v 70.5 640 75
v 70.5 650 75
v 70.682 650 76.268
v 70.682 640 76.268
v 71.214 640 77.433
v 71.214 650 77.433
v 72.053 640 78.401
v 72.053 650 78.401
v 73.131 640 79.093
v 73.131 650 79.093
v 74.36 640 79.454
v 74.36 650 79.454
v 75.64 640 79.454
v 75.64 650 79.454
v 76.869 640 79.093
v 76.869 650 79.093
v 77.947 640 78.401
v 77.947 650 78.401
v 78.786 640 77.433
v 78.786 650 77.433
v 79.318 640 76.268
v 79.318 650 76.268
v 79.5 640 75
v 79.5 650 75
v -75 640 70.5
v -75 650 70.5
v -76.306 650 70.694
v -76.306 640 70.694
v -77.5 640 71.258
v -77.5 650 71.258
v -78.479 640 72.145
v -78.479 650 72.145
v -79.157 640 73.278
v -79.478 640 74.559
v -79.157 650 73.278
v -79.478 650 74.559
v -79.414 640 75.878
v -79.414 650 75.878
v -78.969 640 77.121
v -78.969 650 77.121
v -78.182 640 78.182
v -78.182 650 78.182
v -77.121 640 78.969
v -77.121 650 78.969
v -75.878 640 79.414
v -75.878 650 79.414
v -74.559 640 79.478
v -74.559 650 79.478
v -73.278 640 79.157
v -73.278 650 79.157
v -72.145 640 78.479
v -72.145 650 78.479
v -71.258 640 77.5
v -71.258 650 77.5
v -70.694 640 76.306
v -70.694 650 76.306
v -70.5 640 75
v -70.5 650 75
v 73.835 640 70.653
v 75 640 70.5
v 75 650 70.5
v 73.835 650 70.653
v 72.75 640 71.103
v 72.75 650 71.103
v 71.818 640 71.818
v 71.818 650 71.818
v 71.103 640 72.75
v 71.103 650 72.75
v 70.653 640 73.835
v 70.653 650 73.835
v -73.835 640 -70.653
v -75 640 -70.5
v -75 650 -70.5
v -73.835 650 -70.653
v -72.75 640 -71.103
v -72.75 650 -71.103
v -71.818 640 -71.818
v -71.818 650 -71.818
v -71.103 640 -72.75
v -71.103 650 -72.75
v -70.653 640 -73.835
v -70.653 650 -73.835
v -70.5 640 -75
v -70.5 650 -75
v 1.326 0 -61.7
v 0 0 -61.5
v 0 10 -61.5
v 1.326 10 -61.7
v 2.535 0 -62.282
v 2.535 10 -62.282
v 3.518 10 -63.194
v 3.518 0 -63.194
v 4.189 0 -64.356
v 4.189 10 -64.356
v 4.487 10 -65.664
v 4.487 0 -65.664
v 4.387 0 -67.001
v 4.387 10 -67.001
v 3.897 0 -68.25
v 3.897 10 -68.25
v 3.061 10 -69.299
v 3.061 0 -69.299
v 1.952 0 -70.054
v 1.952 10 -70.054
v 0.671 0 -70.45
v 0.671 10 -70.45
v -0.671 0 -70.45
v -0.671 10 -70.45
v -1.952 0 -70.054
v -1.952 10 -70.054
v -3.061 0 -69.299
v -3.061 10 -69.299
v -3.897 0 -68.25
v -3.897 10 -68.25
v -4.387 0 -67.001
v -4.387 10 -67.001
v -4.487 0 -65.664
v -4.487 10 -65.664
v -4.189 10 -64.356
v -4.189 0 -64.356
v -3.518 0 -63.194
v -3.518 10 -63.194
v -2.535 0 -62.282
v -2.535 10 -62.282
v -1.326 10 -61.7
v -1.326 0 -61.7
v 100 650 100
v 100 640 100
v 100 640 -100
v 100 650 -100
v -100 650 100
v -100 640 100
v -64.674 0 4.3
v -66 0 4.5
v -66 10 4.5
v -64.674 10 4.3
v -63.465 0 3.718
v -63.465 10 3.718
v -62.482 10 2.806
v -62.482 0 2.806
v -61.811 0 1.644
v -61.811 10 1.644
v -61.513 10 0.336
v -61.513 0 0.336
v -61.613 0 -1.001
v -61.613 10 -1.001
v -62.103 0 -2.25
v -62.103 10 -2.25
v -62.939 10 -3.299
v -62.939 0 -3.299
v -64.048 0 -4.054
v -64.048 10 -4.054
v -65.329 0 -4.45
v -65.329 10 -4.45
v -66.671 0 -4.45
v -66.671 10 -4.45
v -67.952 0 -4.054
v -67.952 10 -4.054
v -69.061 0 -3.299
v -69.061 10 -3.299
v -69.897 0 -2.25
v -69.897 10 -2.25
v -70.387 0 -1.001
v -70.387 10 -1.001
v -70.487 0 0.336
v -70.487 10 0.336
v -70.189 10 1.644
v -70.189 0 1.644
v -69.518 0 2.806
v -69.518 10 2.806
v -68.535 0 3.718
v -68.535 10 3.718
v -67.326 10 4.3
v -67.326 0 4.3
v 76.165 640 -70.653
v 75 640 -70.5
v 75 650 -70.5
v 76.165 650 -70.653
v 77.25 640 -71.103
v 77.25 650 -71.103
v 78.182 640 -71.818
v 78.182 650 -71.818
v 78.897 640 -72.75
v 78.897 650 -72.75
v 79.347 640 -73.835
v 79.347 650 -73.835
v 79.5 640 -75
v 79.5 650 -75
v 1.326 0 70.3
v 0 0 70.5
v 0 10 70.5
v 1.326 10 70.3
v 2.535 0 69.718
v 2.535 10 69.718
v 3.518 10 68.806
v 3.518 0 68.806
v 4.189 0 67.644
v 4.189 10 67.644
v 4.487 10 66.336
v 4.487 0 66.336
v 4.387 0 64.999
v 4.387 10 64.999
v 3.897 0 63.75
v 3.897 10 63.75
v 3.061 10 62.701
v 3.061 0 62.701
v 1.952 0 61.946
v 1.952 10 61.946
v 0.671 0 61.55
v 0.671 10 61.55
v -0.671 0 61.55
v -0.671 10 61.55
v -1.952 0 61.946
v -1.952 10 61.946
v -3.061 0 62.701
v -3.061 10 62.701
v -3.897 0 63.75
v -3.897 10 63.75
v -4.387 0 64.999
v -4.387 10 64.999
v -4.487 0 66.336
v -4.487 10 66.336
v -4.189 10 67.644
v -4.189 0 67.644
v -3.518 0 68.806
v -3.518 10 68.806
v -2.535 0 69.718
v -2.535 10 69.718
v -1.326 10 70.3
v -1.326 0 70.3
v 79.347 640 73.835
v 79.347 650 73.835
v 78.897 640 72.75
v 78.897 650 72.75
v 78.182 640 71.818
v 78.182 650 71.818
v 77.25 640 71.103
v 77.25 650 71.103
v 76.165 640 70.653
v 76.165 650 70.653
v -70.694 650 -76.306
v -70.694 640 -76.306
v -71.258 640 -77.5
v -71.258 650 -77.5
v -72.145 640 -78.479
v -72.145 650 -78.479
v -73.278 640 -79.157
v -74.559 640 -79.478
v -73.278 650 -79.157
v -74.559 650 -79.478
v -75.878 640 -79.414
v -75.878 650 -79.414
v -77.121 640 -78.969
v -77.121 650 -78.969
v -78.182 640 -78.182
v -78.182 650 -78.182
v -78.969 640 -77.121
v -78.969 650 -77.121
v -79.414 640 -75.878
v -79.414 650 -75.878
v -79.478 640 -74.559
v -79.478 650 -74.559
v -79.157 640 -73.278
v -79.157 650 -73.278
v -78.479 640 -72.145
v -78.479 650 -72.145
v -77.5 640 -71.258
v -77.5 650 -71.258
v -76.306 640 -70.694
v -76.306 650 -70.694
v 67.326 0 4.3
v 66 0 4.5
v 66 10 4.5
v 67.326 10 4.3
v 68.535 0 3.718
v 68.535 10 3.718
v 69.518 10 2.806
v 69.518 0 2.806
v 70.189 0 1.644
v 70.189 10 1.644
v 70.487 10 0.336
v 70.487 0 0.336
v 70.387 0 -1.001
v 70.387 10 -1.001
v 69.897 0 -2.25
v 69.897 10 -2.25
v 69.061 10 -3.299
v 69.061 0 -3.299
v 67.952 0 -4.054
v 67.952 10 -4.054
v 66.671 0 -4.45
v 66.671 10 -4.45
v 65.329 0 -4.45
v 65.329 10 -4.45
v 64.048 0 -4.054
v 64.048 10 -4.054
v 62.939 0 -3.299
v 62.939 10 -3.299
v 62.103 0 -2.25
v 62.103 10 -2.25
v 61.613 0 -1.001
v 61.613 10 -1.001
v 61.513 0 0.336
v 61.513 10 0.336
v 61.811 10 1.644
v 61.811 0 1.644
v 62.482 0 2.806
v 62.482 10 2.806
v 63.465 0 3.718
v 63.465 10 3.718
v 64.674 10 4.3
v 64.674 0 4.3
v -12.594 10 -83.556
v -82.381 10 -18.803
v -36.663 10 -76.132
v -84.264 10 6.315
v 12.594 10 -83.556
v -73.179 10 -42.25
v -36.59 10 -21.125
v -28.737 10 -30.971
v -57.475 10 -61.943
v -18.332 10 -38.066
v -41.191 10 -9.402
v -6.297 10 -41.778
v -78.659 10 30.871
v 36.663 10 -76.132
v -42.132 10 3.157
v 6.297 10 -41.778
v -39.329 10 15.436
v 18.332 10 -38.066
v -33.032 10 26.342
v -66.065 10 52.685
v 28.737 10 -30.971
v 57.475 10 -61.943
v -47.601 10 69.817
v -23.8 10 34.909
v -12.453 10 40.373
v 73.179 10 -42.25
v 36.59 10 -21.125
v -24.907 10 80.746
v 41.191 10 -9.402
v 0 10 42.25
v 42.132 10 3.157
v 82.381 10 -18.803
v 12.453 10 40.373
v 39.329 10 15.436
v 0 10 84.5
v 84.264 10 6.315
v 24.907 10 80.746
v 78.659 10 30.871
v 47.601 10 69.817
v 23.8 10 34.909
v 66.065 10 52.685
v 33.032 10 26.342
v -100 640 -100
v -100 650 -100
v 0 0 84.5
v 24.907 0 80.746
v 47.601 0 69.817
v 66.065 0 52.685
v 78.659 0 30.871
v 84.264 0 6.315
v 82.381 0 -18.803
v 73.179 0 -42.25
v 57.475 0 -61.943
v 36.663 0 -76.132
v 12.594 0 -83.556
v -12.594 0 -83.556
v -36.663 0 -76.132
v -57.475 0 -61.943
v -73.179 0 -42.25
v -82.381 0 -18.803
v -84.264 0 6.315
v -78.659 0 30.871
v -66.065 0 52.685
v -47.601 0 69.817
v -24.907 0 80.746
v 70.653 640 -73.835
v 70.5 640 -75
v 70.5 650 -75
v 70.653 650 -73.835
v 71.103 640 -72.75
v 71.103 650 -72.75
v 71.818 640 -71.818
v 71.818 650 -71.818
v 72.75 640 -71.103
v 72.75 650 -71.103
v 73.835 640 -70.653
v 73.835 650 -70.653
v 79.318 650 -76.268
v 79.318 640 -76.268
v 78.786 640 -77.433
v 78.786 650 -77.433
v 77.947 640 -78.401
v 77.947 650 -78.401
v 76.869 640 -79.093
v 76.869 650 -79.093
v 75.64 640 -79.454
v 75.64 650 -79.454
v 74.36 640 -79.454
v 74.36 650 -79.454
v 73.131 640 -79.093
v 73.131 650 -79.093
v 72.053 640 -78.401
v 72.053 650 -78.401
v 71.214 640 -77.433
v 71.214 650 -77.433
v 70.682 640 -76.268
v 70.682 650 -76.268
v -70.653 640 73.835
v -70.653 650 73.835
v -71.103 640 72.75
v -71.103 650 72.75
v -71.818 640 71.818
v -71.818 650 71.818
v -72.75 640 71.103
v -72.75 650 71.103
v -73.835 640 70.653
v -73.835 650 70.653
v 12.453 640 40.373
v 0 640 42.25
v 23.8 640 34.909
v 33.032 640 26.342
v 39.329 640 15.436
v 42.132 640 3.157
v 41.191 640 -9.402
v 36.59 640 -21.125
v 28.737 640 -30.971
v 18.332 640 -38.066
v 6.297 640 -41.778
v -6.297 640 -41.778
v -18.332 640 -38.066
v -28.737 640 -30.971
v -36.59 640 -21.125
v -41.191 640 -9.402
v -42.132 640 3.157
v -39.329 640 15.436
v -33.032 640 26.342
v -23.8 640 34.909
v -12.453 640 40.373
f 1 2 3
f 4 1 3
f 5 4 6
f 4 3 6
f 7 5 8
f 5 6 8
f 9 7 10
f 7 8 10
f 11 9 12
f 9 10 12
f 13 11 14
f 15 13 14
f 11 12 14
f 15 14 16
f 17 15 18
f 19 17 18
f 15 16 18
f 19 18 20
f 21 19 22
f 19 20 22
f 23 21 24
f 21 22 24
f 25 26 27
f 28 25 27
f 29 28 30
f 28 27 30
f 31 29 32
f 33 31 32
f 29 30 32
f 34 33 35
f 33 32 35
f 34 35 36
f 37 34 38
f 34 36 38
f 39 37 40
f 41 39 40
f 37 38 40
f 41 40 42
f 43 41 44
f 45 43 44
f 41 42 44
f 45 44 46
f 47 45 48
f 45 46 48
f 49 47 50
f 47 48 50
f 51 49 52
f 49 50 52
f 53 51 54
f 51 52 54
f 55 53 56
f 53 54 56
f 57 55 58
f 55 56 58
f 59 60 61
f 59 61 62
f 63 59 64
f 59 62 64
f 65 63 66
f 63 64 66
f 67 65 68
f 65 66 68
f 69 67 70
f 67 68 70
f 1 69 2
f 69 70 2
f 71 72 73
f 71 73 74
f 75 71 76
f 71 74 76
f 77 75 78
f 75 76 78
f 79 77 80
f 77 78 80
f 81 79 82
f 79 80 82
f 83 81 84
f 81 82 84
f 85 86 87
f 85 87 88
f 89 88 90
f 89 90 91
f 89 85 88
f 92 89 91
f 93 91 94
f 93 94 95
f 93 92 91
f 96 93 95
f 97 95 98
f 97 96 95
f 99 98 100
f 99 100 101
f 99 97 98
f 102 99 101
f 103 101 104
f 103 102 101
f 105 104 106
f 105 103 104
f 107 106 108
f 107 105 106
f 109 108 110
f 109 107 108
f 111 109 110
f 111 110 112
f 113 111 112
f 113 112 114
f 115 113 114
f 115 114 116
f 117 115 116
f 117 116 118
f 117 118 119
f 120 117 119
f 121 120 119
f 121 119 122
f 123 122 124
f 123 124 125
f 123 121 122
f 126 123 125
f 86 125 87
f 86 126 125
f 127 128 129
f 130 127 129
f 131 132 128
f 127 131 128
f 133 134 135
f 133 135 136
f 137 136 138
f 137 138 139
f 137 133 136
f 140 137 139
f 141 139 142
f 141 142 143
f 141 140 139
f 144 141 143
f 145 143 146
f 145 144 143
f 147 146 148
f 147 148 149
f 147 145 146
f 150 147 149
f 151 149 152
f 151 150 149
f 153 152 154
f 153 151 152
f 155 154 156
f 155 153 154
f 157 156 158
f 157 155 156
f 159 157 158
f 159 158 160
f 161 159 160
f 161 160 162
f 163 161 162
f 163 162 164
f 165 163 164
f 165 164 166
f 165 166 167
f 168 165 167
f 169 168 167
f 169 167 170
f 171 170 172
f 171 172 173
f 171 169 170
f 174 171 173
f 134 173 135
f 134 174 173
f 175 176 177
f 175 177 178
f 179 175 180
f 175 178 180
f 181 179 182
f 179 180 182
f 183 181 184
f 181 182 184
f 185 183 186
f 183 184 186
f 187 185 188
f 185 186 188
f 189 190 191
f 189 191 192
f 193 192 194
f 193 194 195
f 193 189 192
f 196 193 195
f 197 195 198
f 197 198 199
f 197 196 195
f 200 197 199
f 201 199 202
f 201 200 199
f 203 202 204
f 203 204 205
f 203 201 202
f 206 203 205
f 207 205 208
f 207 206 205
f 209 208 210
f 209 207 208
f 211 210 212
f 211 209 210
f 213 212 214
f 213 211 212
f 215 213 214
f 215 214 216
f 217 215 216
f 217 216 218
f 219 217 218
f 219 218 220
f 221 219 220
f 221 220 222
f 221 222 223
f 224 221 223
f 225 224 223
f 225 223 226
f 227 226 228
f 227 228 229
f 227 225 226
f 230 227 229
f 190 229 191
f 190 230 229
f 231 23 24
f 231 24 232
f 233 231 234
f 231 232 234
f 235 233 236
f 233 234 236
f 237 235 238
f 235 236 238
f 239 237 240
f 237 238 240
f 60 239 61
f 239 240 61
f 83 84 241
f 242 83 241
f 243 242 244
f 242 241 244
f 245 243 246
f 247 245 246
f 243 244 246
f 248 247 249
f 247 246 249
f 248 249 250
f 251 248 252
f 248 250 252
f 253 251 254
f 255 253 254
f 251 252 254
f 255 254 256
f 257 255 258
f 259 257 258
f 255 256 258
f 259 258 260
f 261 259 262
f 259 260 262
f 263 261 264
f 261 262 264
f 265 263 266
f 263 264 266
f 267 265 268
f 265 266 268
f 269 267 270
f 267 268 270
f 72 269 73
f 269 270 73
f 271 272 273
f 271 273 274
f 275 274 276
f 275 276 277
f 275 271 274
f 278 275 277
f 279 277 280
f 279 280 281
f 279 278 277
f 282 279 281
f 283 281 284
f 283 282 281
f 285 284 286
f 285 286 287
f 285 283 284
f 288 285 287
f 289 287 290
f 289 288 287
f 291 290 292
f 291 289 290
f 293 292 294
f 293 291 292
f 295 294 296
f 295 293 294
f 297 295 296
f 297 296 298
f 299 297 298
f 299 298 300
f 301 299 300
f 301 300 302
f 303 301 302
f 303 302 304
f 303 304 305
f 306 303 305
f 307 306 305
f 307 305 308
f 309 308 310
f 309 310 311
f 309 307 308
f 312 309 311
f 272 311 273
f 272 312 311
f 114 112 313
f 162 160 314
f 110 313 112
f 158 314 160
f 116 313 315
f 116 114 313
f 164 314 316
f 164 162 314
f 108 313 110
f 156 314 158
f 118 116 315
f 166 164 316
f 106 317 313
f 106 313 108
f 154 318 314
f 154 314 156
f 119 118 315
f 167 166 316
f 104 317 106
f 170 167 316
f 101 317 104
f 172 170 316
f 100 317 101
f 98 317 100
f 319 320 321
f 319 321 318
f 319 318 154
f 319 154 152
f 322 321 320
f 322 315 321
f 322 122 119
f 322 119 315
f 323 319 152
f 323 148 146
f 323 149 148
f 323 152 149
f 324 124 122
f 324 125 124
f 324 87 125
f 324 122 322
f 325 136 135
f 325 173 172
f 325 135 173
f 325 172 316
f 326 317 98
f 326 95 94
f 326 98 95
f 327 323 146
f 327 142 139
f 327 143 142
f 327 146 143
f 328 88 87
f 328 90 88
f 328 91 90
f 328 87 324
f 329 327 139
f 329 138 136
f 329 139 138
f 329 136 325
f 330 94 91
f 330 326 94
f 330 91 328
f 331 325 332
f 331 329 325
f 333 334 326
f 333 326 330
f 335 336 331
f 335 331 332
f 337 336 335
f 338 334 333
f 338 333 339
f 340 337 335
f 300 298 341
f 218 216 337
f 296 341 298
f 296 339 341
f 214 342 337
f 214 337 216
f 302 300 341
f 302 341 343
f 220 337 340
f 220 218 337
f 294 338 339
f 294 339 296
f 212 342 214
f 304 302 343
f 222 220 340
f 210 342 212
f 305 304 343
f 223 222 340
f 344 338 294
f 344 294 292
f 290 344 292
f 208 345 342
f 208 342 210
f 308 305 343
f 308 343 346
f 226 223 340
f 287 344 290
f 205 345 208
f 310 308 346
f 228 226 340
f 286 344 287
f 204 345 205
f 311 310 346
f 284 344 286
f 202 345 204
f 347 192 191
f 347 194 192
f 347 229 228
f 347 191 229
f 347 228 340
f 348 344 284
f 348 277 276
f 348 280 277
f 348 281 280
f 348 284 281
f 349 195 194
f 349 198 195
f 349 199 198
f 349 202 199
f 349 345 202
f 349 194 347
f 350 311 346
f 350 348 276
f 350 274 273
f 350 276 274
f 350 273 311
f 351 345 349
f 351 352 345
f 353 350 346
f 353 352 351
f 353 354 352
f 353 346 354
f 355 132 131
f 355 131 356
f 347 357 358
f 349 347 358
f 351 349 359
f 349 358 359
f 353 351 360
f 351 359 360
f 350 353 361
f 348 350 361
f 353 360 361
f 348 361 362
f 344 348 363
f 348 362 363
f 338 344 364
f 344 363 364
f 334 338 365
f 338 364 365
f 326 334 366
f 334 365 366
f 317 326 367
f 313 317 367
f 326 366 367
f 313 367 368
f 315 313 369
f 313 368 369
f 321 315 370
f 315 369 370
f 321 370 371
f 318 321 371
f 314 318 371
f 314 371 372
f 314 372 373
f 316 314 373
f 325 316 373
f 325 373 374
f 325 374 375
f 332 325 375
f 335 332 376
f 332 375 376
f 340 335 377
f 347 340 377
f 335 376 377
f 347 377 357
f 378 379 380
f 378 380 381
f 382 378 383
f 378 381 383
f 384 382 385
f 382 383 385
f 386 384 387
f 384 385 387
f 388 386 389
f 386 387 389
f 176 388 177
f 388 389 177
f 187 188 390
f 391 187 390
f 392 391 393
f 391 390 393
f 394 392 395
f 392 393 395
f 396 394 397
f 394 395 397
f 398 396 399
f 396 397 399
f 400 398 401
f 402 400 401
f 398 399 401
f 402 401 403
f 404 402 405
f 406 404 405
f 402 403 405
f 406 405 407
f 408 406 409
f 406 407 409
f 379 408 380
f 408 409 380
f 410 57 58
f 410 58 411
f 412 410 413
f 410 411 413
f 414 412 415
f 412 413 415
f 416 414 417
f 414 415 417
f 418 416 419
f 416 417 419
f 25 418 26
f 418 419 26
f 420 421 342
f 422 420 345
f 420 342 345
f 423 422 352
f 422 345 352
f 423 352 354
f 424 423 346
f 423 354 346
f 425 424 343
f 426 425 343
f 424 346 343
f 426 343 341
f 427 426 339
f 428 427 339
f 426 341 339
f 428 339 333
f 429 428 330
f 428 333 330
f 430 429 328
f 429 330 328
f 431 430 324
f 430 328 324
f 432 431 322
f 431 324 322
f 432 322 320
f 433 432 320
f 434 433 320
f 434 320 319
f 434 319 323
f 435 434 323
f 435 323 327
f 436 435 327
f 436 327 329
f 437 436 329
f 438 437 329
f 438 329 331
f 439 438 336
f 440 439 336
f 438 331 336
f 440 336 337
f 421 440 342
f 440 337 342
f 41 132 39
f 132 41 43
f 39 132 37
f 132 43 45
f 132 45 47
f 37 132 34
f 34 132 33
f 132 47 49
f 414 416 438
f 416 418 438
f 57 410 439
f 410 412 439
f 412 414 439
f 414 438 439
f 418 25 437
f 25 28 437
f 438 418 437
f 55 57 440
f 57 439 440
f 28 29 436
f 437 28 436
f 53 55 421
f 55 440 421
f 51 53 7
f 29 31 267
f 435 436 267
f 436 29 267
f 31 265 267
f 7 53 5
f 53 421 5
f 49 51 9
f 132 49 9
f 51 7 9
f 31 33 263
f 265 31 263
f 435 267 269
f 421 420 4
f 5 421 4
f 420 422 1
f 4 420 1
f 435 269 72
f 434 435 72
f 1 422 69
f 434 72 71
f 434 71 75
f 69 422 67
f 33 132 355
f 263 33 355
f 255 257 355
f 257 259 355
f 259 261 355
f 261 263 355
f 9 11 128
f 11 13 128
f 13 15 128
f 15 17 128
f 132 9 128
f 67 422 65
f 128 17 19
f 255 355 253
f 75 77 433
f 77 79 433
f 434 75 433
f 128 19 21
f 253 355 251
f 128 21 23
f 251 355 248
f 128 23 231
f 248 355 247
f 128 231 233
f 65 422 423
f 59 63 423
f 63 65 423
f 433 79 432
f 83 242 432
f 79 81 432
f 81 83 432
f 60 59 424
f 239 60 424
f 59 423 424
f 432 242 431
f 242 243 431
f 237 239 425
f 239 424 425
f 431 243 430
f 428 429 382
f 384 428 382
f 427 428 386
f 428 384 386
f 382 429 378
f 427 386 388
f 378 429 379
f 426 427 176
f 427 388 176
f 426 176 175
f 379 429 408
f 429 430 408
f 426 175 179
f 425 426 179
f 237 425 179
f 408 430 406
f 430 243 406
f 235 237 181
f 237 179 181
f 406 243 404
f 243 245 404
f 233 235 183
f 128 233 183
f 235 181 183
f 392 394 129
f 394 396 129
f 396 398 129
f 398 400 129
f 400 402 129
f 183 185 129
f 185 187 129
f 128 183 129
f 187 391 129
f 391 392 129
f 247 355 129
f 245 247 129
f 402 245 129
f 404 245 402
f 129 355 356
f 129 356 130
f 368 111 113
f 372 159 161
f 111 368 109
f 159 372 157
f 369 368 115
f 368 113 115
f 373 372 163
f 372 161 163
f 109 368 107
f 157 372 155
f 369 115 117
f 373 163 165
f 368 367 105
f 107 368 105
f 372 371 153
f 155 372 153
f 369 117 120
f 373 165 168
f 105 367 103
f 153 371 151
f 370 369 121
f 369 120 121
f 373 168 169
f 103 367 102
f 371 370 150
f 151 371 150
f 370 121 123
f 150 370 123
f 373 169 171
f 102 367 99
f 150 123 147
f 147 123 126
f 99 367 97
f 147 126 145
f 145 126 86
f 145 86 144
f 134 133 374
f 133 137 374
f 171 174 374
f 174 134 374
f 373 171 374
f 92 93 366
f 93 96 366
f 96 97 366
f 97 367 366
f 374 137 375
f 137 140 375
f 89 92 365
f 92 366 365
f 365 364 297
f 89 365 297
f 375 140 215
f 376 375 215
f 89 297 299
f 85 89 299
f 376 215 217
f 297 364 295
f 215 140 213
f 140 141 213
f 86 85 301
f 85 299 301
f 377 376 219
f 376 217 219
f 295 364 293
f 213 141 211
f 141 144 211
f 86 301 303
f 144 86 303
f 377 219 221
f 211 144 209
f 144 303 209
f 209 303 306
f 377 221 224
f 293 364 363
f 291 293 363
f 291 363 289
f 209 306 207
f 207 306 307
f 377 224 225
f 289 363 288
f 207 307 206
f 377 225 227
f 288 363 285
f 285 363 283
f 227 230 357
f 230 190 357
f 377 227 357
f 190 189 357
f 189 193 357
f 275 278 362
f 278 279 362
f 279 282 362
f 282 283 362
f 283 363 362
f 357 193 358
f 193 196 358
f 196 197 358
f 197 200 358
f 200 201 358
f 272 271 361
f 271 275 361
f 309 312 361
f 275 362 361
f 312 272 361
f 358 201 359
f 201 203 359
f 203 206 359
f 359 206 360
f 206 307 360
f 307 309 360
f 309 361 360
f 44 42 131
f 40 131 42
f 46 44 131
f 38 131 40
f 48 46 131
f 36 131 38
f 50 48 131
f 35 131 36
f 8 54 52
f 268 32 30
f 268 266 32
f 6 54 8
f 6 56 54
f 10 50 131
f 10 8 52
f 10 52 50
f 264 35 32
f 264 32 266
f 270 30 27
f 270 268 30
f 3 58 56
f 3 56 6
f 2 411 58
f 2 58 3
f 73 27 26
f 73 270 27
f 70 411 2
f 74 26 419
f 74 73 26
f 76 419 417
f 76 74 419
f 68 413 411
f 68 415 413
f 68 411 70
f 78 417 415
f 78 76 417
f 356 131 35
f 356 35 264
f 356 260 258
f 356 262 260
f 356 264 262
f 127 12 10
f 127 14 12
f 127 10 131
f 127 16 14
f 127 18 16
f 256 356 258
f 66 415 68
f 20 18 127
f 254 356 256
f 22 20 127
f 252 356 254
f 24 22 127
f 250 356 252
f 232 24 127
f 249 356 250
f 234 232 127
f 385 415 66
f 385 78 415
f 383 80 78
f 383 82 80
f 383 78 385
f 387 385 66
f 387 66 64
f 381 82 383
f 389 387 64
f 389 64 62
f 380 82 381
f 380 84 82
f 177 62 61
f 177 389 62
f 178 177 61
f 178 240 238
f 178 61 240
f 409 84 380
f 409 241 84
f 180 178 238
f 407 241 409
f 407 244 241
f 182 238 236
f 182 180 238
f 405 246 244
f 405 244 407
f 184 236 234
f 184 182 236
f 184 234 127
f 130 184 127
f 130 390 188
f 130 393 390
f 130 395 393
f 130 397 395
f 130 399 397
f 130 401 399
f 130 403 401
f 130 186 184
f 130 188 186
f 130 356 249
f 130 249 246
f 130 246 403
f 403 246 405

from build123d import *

# Parameters (mm, degrees)
SKETCH1_R           = 84.5
SKETCH1_R_2         = 4.5
BOSS_EXTRUDE4_DEPTH = 10
SKETCH2_R           = 42.25
BOSS_EXTRUDE5_DEPTH = 630
SKETCH4_W           = 200
SKETCH4_H           = 200
BOSS_EXTRUDE6_DEPTH = 10
CUT_EXTRUDE1_DEPTH  = 666.206734783


with BuildPart() as part:
    # Sketch1 → Boss-Extrude4 (new body)
    with BuildSketch(Plane(origin=(0, 0, 0), x_dir=(1, 0, 0), z_dir=(0, 1, 0))):
        with Locations(Location((0, 0, 0), (0, 0, 270))):
            Circle(SKETCH1_R)
        with Locations(Location((0, -66, 0), (0, 0, 270))):
            Circle(SKETCH1_R_2, mode=Mode.SUBTRACT)
        with Locations(Location((66, 0, 0), (0, 0, 270))):
            Circle(SKETCH1_R_2, mode=Mode.SUBTRACT)
        with Locations(Location((-66, 0, 0), (0, 0, 270))):
            Circle(SKETCH1_R_2, mode=Mode.SUBTRACT)
        with Locations(Location((0, 66, 0), (0, 0, 270))):
            Circle(SKETCH1_R_2, mode=Mode.SUBTRACT)
    extrude(amount=BOSS_EXTRUDE4_DEPTH)

    # Sketch2 → Boss-Extrude5 (add)
    with BuildSketch(Plane(origin=(0, 10, 0), x_dir=(1, 0, 0), z_dir=(0, 1, 0))):
        with Locations(Location((0, 0, 0), (0, 0, 270))):
            Circle(SKETCH2_R)
    extrude(amount=BOSS_EXTRUDE5_DEPTH)

    # Sketch4 → Boss-Extrude6 (add)
    with BuildSketch(Plane(origin=(0, 640, 0), x_dir=(1, 0, 0), z_dir=(0, 1, 0))):
        Rectangle(SKETCH4_W, SKETCH4_H)
    extrude(amount=BOSS_EXTRUDE6_DEPTH)

    # Sketch5 → Cut-Extrude1 (cut, through all)
    with BuildSketch(Plane(origin=(0, 650, 0), x_dir=(1, 0, 0), z_dir=(0, 1, 0))):
        with BuildLine():
            Line((-75, -70.5), (-75, -75))
            Line((-75, -75), (-70.5, -75))
            ThreePointArc((-70.5, -75), (-71.818019485, -71.818019485), (-75, -70.5))
        make_face()
        with BuildLine():
            Line((-70.5, -75), (-75, -75))
            Line((-75, -75), (-75, -70.5))
            ThreePointArc((-75, -70.5), (-78.181980515, -78.181980515), (-70.5, -75))
        make_face()
        with BuildLine():
            ThreePointArc((-70.5, 75), (-78.181980515, 78.181980515), (-75, 70.5))
            Line((-75, 70.5), (-75, 75))
            Line((-75, 75), (-70.5, 75))
        make_face()
        with BuildLine():
            Line((-75, 75), (-75, 70.5))
            ThreePointArc((-75, 70.5), (-71.818019485, 71.818019485), (-70.5, 75))
            Line((-70.5, 75), (-75, 75))
        make_face()
        with BuildLine():
            ThreePointArc((70.5, 75), (71.818019485, 71.818019485), (75, 70.5))
            Line((75, 70.5), (75, 75))
            Line((75, 75), (70.5, 75))
        make_face()
        with BuildLine():
            Line((75, 75), (75, 70.5))
            ThreePointArc((75, 70.5), (78.181980515, 71.818019485), (79.5, 75))
            ThreePointArc((79.5, 75), (75, 79.5), (70.5, 75))
            Line((70.5, 75), (75, 75))
        make_face()
        with BuildLine():
            ThreePointArc((75, -70.5), (71.818019485, -71.818019485), (70.5, -75))
            Line((70.5, -75), (75, -75))
            Line((75, -75), (75, -70.5))
        make_face()
        with BuildLine():
            Line((75, -75), (70.5, -75))
            ThreePointArc((70.5, -75), (75, -79.5), (79.5, -75))
            ThreePointArc((79.5, -75), (78.181980515, -71.818019485), (75, -70.5))
            Line((75, -70.5), (75, -75))
        make_face()
    extrude(amount=-CUT_EXTRUDE1_DEPTH, mode=Mode.SUBTRACT)


solid = part.part
